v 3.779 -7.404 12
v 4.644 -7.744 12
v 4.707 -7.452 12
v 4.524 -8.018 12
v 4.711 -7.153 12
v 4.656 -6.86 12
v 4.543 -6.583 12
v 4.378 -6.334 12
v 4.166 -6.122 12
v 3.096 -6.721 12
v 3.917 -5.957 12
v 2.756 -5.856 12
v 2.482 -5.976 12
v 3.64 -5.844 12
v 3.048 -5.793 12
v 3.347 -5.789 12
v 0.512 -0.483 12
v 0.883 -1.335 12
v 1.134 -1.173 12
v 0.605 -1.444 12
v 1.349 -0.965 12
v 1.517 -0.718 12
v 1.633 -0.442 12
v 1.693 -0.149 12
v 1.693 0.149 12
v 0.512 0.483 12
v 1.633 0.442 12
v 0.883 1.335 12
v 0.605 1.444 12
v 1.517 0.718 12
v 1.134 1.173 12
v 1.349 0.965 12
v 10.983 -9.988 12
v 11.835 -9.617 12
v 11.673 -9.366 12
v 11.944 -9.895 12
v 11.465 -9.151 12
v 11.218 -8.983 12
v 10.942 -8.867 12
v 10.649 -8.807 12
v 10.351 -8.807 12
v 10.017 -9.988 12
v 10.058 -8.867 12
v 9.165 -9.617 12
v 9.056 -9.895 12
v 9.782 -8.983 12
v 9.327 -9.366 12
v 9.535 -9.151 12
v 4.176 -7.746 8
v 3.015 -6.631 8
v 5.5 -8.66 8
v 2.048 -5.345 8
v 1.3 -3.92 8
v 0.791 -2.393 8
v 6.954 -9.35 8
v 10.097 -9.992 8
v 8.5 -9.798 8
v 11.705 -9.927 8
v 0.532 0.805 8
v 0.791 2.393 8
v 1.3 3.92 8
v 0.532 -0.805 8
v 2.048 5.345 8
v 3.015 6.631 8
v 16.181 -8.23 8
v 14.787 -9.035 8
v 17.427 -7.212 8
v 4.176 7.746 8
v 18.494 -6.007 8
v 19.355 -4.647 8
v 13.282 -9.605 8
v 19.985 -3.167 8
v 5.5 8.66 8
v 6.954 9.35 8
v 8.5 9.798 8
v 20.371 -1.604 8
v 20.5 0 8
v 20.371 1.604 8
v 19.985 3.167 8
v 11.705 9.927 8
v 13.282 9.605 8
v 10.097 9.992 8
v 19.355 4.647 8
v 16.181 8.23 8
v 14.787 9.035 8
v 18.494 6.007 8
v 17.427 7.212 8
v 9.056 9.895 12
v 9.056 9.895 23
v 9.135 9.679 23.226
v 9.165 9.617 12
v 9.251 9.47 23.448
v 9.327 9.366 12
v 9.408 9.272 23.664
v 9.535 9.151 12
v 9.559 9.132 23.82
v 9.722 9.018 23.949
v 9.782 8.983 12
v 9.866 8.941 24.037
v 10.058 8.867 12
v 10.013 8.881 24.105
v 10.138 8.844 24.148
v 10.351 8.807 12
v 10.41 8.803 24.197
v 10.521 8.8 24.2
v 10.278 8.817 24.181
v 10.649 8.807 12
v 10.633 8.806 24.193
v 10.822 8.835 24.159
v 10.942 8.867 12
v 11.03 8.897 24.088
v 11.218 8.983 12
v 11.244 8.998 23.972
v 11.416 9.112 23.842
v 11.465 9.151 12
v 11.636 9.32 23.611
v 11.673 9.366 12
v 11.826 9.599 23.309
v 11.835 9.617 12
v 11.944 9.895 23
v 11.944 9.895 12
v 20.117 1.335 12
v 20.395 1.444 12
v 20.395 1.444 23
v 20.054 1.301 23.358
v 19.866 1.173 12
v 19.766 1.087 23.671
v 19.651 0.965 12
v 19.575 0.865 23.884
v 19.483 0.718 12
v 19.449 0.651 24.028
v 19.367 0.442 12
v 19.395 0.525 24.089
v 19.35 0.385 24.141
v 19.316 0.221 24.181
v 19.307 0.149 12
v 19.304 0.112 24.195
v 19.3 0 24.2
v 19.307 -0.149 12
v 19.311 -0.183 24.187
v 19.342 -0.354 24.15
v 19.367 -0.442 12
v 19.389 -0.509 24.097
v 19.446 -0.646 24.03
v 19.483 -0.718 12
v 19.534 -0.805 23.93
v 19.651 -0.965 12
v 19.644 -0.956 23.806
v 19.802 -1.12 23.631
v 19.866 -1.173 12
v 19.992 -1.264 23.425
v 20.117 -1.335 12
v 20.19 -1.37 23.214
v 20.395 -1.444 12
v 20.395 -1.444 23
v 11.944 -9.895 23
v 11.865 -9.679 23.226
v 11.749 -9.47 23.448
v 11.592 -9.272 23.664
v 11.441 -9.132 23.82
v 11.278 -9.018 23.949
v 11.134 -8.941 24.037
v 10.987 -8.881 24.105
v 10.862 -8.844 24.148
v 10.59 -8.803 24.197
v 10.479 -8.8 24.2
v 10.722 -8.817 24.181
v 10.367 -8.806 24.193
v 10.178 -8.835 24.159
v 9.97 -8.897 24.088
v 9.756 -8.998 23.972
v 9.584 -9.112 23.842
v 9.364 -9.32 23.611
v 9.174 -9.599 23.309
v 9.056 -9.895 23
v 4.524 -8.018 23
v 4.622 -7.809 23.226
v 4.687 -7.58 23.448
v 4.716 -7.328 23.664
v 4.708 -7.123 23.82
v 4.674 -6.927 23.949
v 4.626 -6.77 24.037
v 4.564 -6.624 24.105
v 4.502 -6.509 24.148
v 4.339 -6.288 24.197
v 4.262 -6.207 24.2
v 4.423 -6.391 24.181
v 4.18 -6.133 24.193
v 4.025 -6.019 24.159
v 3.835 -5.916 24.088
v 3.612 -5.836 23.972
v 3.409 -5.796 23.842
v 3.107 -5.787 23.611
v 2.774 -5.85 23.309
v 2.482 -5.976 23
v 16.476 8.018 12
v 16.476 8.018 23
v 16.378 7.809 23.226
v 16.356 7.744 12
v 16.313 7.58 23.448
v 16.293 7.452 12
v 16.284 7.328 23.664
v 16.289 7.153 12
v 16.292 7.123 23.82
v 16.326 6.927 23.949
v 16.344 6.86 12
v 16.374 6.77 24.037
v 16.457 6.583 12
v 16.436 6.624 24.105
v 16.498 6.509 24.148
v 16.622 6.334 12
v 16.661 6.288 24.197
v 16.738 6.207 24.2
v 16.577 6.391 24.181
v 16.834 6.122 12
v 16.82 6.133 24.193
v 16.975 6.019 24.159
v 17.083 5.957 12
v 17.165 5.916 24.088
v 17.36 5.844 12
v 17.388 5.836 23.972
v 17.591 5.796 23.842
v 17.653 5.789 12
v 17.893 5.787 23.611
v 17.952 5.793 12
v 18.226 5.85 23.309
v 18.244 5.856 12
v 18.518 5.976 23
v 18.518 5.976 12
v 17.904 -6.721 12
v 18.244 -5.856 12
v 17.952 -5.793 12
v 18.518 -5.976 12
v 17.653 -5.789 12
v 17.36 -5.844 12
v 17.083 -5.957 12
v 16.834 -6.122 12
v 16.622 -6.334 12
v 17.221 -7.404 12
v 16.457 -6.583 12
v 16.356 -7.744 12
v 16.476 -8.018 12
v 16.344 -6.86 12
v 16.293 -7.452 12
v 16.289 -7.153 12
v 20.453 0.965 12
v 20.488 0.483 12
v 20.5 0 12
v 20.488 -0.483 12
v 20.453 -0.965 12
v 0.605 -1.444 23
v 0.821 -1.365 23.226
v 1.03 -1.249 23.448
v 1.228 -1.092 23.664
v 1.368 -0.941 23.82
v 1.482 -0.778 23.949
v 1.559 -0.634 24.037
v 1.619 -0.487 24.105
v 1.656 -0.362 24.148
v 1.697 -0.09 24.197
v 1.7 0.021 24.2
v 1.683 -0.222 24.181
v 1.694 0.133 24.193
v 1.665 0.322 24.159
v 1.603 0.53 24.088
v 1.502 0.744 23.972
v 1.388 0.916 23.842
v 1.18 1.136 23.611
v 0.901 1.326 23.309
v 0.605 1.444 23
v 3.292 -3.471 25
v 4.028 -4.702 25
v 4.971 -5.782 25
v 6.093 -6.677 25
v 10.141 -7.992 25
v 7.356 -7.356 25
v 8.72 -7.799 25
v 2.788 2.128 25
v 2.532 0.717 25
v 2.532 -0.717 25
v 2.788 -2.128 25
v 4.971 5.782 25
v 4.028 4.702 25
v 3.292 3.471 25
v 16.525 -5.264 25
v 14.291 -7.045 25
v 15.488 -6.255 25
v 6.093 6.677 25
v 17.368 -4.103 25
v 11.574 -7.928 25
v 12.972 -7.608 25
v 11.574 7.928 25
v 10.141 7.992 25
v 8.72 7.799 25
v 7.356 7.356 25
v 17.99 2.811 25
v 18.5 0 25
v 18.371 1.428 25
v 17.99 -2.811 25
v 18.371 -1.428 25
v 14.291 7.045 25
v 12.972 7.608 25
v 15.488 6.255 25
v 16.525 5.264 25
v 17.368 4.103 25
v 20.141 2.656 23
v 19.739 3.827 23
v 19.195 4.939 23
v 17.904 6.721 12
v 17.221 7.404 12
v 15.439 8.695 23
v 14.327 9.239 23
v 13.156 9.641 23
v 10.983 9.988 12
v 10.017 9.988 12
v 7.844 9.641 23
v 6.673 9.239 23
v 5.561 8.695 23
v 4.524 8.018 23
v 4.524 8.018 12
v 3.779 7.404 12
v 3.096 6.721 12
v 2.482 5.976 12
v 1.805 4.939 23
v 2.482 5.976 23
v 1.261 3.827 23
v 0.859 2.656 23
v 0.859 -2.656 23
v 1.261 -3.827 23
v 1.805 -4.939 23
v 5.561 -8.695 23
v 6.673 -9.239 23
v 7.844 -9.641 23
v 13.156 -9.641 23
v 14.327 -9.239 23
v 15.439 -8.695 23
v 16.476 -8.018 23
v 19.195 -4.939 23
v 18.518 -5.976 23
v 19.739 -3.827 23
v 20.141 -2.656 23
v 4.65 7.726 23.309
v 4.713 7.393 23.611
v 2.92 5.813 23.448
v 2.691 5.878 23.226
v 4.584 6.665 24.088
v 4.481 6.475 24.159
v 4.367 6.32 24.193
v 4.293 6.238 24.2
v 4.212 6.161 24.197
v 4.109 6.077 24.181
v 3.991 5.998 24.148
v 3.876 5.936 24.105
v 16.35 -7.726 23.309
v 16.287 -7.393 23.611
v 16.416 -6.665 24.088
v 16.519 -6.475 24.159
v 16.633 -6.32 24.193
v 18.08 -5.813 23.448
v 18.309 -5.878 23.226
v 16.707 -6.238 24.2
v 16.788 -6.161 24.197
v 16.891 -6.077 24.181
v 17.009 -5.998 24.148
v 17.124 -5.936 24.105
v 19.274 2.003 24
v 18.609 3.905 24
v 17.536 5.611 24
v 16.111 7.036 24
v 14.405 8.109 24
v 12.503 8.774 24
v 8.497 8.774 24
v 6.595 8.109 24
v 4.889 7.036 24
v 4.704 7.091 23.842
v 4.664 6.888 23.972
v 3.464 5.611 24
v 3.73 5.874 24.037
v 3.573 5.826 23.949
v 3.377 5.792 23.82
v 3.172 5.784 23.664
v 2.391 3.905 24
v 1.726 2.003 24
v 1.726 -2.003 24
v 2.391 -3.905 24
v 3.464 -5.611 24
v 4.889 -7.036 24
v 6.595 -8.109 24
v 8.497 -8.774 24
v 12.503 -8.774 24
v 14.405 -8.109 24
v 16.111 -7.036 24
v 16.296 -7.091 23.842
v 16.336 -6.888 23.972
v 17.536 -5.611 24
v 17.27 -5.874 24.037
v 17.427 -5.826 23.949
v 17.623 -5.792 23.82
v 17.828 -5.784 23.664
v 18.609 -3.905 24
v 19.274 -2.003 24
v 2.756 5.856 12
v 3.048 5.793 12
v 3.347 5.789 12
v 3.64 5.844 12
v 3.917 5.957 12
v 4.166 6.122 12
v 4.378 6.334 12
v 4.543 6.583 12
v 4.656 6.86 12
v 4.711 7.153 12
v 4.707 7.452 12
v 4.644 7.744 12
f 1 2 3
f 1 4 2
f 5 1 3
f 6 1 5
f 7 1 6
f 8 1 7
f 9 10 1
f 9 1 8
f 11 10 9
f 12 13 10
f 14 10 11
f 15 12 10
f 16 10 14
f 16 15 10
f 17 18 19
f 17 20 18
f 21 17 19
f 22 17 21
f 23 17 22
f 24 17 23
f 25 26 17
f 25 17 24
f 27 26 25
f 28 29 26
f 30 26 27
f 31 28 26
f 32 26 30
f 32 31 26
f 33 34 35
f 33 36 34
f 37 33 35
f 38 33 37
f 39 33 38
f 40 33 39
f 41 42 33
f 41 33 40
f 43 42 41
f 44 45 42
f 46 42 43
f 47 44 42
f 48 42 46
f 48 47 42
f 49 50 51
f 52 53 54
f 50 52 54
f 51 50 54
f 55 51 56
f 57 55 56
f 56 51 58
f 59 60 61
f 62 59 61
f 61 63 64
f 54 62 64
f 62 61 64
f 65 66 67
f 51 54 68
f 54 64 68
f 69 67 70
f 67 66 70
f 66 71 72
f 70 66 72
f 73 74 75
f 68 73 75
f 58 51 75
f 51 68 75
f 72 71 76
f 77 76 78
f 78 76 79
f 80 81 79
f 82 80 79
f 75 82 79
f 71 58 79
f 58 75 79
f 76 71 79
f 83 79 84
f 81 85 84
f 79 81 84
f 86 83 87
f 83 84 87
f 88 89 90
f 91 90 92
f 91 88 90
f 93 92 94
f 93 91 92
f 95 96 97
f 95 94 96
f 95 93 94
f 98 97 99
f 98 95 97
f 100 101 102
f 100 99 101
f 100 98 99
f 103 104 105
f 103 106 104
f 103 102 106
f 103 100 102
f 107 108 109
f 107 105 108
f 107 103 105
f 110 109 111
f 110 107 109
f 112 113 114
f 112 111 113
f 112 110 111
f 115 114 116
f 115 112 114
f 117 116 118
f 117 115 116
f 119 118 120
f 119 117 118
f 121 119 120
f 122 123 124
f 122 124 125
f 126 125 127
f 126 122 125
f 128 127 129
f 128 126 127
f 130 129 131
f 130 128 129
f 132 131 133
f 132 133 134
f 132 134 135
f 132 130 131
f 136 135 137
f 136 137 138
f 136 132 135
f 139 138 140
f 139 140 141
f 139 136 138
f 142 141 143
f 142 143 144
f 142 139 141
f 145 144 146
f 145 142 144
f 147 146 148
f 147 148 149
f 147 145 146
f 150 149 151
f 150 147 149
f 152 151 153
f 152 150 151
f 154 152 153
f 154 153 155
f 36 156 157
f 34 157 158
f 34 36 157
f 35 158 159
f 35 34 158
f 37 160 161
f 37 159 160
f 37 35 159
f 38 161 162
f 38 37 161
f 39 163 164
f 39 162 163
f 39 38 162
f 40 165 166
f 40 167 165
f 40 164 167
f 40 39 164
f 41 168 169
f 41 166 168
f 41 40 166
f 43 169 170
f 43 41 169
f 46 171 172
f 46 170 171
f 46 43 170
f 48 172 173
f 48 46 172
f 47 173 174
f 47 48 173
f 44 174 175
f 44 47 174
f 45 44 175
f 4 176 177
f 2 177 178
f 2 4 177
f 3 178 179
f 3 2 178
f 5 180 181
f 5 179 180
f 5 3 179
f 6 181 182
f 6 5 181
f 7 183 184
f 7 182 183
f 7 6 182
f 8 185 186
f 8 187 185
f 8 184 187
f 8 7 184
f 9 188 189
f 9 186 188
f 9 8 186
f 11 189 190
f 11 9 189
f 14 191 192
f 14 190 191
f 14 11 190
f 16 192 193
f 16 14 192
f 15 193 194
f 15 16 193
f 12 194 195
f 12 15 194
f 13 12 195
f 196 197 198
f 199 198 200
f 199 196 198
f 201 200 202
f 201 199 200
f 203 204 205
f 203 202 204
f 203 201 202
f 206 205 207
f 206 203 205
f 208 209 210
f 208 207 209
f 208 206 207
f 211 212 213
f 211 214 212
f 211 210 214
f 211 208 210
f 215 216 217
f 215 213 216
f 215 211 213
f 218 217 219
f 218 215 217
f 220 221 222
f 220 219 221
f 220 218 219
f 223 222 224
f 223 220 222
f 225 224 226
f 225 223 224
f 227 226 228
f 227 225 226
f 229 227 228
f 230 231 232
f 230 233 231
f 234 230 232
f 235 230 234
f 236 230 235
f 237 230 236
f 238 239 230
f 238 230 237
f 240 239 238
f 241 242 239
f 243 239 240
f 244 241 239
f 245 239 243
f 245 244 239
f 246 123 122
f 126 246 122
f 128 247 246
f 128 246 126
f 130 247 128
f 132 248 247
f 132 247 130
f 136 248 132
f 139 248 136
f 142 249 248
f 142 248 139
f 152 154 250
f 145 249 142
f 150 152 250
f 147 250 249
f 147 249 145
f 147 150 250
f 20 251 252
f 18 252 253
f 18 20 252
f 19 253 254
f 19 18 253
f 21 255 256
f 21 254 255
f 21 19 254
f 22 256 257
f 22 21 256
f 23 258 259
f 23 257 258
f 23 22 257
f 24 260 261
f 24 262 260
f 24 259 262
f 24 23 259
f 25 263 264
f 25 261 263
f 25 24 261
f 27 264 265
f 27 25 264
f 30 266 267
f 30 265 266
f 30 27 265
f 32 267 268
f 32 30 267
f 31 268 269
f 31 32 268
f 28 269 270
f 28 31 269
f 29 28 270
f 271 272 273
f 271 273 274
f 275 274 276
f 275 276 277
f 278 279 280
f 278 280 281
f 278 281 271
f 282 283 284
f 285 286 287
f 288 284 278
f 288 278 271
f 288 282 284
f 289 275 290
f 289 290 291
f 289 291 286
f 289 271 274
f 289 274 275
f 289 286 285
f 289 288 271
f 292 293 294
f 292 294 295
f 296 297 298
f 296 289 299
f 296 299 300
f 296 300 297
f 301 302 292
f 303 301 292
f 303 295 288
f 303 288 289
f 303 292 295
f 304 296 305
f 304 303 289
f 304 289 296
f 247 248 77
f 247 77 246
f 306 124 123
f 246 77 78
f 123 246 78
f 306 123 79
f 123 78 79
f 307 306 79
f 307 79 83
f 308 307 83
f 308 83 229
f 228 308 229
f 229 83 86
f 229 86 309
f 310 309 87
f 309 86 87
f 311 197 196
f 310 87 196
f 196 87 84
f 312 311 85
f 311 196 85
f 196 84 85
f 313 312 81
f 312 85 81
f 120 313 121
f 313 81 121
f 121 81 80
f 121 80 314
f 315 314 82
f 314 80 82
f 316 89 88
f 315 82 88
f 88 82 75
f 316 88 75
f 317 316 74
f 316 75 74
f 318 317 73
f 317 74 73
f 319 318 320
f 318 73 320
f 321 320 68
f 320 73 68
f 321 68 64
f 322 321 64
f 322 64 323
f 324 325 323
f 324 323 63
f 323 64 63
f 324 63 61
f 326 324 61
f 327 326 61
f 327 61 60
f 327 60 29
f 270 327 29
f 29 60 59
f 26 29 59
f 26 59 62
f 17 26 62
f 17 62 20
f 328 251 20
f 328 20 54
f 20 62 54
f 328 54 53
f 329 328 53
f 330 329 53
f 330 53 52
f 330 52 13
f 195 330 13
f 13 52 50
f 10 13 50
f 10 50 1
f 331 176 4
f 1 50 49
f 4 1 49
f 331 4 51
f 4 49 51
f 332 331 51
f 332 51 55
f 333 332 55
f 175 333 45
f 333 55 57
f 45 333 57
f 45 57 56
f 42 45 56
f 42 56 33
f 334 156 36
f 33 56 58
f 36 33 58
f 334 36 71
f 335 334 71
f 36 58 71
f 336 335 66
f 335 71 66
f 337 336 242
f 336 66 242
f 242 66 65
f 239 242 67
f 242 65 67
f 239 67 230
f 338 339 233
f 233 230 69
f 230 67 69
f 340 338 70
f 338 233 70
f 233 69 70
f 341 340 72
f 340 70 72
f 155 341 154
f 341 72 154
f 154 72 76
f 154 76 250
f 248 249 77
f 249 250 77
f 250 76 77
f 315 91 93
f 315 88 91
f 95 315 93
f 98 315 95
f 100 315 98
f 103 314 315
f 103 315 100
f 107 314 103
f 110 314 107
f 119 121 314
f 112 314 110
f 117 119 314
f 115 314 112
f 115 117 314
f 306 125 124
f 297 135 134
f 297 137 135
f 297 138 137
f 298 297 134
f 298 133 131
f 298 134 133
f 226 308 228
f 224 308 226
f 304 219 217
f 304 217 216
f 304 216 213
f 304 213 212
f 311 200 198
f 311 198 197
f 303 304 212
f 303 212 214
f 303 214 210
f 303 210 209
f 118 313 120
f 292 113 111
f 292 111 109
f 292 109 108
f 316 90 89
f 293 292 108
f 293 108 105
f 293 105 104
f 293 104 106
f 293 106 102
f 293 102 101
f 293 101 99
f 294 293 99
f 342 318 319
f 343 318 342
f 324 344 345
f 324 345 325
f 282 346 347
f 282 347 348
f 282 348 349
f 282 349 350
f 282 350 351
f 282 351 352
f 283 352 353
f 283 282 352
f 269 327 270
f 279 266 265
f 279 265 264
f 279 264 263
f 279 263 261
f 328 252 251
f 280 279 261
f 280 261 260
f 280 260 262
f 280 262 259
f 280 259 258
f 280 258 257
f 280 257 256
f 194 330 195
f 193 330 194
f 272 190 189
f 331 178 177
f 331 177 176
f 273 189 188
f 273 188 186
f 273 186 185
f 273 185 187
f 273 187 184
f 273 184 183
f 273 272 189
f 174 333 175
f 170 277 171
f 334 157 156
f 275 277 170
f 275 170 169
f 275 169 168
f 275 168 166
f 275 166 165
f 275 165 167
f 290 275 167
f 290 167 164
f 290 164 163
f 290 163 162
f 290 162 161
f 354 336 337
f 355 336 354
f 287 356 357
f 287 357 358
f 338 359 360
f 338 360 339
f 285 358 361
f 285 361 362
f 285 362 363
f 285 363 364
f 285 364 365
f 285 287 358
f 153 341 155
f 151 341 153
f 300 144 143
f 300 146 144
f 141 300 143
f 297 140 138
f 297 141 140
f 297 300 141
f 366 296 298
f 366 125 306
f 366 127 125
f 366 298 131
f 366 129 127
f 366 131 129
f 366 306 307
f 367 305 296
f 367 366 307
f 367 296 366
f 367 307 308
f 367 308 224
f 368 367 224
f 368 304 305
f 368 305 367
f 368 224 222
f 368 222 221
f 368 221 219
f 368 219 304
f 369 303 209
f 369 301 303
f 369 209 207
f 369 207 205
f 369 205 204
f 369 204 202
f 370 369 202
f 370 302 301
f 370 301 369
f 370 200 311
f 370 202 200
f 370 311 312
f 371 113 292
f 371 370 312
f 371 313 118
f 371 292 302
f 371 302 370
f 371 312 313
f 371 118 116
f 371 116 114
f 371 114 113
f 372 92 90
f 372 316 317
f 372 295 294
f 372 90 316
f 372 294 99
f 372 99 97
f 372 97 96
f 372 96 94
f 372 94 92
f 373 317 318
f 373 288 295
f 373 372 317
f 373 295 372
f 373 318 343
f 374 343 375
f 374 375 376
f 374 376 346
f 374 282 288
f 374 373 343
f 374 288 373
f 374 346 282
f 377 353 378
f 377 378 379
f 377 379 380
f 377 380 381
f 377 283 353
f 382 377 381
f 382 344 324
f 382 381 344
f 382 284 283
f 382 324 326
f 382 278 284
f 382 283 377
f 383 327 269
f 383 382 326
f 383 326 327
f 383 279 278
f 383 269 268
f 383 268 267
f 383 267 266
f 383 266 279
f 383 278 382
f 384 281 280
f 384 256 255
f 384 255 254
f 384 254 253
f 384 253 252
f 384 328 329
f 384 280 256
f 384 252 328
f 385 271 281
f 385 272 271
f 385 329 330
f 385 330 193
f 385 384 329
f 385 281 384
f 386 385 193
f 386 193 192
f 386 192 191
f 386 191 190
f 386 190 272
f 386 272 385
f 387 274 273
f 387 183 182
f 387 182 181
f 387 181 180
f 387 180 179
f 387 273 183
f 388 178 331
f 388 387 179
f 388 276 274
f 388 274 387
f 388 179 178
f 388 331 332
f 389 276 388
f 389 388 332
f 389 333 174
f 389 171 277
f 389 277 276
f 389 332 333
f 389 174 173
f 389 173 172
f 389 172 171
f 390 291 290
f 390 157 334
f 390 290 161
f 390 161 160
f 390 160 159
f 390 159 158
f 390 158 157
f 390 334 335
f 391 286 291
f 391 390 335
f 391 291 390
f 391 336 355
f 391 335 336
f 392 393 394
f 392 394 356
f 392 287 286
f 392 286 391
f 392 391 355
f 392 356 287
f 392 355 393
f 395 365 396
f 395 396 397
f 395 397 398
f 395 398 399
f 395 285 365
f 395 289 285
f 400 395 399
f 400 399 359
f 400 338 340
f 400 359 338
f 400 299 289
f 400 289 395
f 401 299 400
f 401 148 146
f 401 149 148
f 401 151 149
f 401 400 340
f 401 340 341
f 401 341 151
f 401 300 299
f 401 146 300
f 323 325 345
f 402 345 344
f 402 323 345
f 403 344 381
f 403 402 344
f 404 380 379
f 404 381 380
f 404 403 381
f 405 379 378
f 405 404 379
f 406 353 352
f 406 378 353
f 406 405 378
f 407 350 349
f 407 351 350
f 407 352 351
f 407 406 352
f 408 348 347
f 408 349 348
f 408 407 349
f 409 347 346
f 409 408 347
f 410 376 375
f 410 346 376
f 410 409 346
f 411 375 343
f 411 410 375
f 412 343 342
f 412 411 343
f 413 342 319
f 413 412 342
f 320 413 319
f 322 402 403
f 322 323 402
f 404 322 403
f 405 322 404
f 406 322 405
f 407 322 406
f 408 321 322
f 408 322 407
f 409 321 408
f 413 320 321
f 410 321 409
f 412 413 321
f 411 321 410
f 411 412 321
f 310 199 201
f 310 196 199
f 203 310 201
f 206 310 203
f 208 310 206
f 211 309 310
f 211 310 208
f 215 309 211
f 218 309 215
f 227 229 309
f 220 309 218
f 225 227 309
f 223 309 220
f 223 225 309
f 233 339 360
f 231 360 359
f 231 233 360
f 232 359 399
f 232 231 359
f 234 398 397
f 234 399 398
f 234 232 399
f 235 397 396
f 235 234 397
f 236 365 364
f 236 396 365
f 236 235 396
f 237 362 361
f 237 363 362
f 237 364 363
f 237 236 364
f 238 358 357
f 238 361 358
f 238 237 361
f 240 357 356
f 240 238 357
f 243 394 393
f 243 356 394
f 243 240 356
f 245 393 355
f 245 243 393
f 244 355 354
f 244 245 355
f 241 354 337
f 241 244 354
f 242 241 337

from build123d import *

# Parameters (mm, degrees)
CYLINDER001_R     = 1.5
CYLINDER001_DEPTH = 15
ARRAY_COUNT       = 8
CYLINDER_R        = 10
CYLINDER_DEPTH    = 17
CHAMFER_SIZE      = 2


with BuildPart() as array:
    # Cylinder001 → Cylinder001 (new body)
    with BuildSketch(Plane(origin=(0.2, 0, 12), x_dir=(1, 0, 0), z_dir=(0, 0, 1))):
        Circle(CYLINDER001_R)
    extrude(amount=CYLINDER001_DEPTH)

    # Array: Array ×8 about axis
    array_axis = Axis((10.5, 0, 0), (0, 0, 1))


with BuildPart() as array_1:
    add(array.part)
    for i in range(1, ARRAY_COUNT):
        add(array.part.rotate(array_axis, i * 360 / ARRAY_COUNT))


with BuildPart() as cut:
    # Cylinder → Cylinder (new body)
    with BuildSketch(Plane(origin=(10.5, 0, 8), x_dir=(1, 0, 0), z_dir=(0, 0, 1))):
        Circle(CYLINDER_R)
    extrude(amount=CYLINDER_DEPTH)

    # Chamfer
    chamfer_edges = [cut.edges().sort_by_distance(p)[0] for p in [
        (0.5, 0, 25),
    ]]
    chamfer(chamfer_edges, length=CHAMFER_SIZE)

    # Cut: cut Array
    add(array_1.part, mode=Mode.SUBTRACT)


solid = cut.part
